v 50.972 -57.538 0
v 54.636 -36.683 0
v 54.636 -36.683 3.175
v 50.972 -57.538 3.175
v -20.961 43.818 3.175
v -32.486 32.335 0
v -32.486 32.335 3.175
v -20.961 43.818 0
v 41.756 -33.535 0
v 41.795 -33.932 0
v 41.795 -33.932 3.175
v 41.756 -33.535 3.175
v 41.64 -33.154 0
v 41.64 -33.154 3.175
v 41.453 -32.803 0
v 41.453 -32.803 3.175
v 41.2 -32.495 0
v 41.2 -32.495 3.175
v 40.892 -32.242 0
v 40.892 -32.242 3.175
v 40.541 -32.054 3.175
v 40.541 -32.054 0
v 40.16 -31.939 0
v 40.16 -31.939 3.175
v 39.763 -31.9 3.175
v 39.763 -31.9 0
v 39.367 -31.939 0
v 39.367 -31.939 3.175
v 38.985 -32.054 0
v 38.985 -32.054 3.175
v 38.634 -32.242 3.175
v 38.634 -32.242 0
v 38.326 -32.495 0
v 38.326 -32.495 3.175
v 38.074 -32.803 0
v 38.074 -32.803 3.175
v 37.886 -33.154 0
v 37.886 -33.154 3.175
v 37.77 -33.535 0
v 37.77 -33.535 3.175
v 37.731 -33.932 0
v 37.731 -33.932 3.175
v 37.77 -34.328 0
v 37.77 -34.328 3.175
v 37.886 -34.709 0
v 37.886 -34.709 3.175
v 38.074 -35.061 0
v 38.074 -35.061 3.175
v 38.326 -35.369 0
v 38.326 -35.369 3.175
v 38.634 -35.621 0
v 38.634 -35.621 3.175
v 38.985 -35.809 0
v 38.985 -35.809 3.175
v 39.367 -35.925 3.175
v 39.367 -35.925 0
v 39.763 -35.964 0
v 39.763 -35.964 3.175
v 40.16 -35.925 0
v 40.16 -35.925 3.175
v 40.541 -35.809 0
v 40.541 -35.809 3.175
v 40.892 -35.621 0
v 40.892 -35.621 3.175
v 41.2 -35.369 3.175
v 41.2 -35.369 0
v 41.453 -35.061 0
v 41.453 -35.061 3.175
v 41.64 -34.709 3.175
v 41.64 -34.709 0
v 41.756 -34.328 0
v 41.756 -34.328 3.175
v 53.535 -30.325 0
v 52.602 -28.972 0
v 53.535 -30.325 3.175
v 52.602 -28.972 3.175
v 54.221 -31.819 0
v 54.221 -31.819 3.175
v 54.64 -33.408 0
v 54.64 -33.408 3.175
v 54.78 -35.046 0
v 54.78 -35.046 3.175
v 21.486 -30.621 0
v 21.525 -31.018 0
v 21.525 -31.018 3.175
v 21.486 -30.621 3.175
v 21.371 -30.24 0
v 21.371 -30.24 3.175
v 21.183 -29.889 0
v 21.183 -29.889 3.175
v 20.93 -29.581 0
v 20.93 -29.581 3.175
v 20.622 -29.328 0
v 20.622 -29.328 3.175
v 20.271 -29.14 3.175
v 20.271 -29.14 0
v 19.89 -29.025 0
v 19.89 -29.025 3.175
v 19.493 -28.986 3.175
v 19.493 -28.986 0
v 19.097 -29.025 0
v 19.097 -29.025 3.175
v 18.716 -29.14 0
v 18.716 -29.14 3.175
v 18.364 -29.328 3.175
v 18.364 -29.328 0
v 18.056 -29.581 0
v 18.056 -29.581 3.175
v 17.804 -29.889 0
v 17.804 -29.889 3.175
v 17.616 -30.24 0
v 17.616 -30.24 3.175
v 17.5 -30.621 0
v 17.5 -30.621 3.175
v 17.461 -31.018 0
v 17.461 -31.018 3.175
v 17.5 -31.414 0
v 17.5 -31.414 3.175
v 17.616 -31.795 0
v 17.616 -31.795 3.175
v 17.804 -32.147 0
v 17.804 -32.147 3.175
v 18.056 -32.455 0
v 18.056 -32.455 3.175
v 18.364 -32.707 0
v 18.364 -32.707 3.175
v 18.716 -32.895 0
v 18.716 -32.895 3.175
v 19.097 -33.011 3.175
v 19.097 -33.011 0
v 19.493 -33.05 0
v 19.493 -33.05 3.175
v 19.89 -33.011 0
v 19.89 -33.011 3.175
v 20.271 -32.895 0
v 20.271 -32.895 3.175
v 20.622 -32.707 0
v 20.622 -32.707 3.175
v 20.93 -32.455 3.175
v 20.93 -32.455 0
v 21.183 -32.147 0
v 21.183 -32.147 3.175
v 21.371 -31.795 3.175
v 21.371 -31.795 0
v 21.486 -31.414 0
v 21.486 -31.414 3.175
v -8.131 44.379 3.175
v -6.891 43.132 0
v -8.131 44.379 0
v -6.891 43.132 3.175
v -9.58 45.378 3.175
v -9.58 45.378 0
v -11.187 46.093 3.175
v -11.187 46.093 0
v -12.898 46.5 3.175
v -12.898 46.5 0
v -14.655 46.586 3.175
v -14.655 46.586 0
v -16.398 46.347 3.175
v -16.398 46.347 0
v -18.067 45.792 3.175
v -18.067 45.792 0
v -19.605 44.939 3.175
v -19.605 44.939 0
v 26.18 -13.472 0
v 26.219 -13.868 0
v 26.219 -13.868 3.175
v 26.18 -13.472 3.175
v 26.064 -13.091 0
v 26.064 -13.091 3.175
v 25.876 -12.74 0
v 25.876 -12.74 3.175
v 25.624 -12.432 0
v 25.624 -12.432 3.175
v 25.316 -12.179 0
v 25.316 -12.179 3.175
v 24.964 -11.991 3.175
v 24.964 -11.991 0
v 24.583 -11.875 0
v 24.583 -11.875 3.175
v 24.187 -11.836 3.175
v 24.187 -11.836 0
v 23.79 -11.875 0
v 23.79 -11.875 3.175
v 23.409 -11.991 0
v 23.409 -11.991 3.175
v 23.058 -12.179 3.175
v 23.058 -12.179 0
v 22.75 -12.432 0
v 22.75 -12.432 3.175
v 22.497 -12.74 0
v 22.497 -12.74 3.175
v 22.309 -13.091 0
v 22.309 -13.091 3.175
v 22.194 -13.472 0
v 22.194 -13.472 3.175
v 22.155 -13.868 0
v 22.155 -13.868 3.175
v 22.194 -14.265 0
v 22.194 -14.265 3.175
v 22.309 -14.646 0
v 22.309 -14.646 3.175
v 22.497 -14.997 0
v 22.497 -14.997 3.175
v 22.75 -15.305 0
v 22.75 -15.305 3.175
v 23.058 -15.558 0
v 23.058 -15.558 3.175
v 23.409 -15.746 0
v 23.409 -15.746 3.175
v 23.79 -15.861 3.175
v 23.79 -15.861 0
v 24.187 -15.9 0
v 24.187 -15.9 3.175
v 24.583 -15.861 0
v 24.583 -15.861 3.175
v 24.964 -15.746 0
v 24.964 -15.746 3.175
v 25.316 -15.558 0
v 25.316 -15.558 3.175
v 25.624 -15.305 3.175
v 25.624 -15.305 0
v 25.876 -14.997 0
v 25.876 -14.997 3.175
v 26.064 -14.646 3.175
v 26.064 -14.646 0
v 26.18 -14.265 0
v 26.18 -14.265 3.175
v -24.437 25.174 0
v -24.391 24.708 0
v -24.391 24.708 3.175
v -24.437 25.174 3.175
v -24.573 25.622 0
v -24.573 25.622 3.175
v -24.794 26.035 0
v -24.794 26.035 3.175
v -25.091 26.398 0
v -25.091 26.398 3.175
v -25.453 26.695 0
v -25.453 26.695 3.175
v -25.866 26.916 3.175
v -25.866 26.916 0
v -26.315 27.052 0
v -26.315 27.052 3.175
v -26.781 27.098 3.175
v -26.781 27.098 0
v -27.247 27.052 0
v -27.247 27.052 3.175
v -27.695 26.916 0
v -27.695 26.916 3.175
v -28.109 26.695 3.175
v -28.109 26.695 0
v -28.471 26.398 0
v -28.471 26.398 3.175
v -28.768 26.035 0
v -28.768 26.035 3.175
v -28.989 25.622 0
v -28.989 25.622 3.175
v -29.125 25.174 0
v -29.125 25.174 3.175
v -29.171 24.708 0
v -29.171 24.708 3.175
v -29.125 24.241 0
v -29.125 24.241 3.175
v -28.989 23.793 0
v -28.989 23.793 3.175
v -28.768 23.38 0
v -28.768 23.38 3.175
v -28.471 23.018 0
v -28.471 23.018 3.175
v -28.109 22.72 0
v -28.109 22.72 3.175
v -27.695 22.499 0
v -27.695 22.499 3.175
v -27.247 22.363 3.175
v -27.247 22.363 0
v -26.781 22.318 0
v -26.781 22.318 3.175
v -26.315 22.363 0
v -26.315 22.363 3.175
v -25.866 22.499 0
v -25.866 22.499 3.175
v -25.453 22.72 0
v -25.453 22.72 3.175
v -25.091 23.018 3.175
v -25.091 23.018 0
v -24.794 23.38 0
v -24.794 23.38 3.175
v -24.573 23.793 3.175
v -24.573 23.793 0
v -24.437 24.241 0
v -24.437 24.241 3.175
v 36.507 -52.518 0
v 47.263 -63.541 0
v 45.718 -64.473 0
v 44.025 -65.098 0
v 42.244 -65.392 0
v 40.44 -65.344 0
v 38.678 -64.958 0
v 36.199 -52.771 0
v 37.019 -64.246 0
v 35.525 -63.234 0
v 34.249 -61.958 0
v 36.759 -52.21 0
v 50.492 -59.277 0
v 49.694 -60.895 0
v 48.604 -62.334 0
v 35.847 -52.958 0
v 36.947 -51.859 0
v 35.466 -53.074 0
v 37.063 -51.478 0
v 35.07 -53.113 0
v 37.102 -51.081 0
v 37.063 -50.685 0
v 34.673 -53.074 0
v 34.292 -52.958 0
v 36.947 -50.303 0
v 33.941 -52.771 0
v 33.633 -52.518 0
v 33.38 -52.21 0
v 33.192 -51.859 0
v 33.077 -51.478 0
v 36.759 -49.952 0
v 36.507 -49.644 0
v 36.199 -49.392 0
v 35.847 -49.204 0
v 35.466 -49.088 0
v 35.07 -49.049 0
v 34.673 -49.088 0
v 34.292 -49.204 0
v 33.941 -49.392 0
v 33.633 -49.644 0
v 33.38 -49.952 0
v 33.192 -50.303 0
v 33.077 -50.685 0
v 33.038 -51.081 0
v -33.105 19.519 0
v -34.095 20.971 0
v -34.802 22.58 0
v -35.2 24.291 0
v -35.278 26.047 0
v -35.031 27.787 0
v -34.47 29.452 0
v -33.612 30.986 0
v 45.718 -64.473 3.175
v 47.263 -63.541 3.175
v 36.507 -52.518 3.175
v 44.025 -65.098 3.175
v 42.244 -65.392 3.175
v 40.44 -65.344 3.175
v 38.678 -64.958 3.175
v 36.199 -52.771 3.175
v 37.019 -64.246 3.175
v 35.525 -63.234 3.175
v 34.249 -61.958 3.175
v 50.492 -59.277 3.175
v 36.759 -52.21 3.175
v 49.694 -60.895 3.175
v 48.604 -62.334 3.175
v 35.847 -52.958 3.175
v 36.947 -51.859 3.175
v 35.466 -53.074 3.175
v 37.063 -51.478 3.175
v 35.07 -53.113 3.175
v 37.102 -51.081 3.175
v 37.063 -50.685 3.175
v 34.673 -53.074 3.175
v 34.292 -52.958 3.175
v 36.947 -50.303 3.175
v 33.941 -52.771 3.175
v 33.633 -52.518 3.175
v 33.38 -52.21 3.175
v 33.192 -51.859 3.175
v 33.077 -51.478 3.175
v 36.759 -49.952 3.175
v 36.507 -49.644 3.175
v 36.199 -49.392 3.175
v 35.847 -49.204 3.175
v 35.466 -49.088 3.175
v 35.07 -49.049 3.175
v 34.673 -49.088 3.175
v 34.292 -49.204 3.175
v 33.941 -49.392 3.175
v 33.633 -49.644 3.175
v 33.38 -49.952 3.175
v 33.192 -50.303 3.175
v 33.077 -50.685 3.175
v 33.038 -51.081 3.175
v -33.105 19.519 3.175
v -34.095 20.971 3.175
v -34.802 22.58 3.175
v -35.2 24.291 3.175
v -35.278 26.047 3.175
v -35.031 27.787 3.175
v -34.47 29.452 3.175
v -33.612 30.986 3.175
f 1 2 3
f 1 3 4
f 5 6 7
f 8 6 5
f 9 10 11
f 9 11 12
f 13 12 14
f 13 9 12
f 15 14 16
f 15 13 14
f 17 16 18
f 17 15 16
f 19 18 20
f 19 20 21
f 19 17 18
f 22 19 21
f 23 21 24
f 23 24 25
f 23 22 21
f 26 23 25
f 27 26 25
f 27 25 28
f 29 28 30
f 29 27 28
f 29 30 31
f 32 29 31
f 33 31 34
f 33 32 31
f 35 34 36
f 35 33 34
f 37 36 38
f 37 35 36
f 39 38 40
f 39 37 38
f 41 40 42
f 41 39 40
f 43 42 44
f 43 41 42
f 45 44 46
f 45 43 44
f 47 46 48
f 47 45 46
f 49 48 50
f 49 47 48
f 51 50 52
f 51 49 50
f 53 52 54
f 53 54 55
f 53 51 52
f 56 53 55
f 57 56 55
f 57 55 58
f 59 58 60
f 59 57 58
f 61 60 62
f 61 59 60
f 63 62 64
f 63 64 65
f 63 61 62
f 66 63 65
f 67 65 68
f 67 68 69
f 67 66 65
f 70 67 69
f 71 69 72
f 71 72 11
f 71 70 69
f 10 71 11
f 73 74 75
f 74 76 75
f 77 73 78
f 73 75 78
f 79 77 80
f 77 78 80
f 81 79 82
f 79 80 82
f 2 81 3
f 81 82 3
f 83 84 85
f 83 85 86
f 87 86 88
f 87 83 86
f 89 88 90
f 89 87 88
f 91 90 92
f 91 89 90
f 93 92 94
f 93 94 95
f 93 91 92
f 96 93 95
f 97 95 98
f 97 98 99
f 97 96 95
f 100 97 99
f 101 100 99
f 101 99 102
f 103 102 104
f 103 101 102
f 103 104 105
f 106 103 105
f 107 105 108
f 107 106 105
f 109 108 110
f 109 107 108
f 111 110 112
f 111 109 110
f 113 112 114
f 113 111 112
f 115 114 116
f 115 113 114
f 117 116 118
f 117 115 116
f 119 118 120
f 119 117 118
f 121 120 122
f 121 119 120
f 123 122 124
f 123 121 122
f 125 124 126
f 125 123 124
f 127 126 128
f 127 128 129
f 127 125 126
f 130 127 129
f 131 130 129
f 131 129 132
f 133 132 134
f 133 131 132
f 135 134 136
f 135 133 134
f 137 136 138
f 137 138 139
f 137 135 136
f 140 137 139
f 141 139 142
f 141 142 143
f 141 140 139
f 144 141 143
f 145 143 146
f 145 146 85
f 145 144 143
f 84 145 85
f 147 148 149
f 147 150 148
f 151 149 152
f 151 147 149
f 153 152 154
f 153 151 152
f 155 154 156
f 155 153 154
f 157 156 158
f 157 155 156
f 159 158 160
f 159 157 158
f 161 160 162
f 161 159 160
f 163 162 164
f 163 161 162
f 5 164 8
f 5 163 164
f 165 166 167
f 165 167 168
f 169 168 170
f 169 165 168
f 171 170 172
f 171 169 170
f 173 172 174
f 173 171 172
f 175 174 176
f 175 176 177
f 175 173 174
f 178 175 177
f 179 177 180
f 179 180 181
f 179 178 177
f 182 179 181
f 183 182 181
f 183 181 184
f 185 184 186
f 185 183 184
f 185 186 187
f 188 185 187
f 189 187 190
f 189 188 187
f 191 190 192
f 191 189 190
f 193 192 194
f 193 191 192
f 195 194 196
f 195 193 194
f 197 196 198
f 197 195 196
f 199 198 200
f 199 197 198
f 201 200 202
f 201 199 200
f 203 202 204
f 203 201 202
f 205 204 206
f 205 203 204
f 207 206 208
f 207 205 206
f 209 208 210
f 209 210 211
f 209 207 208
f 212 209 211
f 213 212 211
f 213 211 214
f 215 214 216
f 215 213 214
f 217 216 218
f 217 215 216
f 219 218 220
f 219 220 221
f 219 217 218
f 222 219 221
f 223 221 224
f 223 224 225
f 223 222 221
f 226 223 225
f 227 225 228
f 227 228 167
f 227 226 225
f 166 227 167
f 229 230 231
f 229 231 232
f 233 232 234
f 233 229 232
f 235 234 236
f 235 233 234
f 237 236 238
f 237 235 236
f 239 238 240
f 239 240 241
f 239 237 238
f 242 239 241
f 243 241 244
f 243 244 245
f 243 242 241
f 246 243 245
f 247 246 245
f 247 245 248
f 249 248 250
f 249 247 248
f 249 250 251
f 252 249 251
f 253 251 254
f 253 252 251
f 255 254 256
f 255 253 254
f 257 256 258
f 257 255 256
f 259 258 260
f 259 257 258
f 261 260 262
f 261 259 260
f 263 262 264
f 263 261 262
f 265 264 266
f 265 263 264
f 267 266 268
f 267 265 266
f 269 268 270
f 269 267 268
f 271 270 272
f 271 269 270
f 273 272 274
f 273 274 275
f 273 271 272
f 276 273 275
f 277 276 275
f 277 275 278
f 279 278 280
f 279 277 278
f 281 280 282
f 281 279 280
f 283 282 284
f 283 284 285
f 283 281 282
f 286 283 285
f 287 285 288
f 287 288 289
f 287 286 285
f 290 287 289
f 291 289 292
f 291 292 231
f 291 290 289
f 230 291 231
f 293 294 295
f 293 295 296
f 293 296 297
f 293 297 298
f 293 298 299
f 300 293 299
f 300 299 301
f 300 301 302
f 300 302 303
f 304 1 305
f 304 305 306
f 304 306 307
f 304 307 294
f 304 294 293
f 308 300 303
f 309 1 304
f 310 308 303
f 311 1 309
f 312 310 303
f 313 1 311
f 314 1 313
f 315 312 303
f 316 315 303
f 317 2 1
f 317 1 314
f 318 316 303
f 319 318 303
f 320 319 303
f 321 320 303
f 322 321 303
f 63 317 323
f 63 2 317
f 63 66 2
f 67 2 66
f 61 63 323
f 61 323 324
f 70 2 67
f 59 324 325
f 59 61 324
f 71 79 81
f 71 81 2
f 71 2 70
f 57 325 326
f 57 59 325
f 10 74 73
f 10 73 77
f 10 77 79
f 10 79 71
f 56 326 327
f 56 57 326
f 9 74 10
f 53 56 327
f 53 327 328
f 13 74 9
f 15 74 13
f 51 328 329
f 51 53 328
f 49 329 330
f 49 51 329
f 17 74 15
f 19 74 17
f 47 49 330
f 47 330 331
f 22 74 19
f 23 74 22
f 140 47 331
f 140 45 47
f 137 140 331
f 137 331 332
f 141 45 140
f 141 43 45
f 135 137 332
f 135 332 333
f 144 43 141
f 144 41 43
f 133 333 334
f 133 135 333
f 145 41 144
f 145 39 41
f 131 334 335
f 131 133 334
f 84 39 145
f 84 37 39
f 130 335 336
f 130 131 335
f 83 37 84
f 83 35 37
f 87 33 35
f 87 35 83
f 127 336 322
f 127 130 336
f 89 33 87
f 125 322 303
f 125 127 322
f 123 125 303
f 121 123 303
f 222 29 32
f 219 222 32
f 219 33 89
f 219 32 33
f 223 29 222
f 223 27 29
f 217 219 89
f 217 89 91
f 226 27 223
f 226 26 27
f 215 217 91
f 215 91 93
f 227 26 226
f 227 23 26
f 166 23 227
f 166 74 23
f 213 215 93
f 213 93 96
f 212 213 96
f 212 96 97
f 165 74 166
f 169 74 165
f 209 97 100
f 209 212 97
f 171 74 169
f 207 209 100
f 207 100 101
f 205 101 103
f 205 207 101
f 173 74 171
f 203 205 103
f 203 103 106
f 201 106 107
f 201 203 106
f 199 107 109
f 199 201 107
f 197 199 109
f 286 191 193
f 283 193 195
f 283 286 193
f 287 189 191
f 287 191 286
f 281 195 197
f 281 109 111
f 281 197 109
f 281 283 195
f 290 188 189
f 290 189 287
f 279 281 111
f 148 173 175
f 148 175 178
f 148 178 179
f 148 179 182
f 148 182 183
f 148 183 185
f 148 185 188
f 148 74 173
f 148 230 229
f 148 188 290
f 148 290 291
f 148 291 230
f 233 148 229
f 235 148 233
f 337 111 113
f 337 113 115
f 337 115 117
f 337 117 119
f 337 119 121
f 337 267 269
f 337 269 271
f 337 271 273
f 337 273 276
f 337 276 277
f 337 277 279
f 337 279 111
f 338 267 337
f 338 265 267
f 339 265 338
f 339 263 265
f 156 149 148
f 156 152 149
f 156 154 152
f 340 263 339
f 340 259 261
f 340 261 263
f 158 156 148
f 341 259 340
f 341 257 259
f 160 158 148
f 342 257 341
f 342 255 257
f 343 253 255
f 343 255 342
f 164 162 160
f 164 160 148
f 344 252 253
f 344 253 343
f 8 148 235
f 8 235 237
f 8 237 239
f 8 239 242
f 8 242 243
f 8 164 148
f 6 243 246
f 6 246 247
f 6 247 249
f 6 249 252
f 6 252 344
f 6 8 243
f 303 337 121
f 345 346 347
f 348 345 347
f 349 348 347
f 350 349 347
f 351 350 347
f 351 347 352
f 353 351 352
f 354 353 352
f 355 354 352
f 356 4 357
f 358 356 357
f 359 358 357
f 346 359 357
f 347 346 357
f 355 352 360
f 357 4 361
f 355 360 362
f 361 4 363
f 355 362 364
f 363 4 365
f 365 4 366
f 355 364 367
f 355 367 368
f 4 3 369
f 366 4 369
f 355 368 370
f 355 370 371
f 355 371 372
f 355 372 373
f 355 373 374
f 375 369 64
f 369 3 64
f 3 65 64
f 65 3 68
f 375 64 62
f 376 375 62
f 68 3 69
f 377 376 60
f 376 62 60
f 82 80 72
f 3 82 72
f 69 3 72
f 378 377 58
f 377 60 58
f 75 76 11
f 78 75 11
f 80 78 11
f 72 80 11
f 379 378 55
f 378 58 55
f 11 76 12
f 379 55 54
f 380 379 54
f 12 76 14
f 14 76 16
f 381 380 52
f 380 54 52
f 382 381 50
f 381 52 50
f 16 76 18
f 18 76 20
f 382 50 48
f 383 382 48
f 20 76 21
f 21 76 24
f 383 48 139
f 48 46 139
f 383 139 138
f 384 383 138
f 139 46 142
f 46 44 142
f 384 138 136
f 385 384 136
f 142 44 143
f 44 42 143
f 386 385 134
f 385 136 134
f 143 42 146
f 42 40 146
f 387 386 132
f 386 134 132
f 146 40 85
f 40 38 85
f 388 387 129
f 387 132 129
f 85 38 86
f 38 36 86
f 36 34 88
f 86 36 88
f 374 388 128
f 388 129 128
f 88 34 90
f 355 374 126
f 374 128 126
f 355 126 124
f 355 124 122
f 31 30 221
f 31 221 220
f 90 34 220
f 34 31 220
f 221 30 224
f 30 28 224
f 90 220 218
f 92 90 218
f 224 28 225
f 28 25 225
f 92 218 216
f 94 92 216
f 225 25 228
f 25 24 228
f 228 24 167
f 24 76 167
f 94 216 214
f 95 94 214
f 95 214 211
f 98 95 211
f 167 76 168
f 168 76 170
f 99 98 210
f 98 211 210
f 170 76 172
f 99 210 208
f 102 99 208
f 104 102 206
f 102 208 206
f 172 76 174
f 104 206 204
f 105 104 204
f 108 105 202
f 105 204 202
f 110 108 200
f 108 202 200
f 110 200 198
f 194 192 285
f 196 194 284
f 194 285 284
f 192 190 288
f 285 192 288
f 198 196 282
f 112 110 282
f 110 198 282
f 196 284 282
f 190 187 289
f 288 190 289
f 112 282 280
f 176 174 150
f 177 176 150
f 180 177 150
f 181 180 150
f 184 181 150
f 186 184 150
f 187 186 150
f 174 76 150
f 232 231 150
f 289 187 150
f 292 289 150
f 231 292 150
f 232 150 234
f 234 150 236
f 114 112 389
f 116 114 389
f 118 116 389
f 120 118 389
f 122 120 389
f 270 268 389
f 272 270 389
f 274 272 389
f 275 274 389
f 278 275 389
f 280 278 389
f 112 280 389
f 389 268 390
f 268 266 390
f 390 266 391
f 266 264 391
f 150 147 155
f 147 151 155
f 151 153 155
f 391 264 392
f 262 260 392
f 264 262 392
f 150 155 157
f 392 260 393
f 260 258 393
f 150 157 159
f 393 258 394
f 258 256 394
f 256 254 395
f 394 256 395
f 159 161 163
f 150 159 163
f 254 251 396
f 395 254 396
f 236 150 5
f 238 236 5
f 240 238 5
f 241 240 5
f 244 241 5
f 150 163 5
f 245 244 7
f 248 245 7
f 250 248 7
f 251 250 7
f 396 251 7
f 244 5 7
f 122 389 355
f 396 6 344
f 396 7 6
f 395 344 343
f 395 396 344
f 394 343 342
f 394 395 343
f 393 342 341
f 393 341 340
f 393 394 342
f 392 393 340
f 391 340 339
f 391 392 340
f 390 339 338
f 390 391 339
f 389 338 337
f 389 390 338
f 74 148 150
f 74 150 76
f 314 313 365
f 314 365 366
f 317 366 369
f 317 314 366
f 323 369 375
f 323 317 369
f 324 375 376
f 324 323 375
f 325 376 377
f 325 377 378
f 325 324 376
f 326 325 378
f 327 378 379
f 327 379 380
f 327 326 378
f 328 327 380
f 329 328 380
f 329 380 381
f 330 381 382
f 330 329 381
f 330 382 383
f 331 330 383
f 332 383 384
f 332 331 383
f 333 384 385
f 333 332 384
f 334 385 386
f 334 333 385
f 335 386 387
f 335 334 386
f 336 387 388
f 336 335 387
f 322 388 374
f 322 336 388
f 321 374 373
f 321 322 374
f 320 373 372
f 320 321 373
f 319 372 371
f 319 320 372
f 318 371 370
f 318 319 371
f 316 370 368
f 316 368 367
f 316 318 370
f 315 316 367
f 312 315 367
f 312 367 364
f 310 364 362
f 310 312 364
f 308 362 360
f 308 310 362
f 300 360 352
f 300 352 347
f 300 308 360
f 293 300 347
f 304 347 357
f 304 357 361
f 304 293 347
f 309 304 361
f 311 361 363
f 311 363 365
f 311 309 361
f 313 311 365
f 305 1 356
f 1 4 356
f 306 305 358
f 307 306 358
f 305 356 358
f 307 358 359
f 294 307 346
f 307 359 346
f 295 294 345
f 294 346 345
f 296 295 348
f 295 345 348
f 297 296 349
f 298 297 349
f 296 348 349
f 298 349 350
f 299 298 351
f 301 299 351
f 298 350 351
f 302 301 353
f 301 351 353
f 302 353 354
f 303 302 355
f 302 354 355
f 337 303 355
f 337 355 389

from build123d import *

# Parameters (mm, degrees)
SKETCH1_R           = 2.39
SKETCH1_R_2         = 2.032
BOSS_EXTRUDE1_DEPTH = 3.175
FILLET1_R           = 9.525


with BuildPart() as part:
    # Sketch1 → Boss-Extrude1 (new body)
    with BuildSketch(Plane.XY):
        Polygon((-13.549562782, 51.201238591), (55.395997605, -32.358681046), (47.399630983, -77.865858829), (-38.635835903, 26.208991527), align=None)
        with Locations((-26.780789006, 24.707545021)):
            Circle(SKETCH1_R, mode=Mode.SUBTRACT)
        with Locations((24.186660888, -13.868436177)):
            Circle(SKETCH1_R_2, mode=Mode.SUBTRACT)
        with Locations((19.493324021, -31.017809025)):
            Circle(SKETCH1_R_2, mode=Mode.SUBTRACT)
        with Locations((39.76308397, -33.93171218)):
            Circle(SKETCH1_R_2, mode=Mode.SUBTRACT)
        with Locations((35.069747103, -51.081085027)):
            Circle(SKETCH1_R_2, mode=Mode.SUBTRACT)
    extrude(amount=BOSS_EXTRUDE1_DEPTH)

    # Fillet1
    fillet1_edges = [part.edges().sort_by_distance(p)[0] for p in [
        (-13.549562782, 51.201238591, 1.5875),
        (55.395997605, -32.358681046, 1.5875),
        (47.399630983, -77.865858829, 1.5875),
        (-38.635835903, 26.208991527, 1.5875),
    ]]
    fillet(fillet1_edges, radius=FILLET1_R)


solid = part.part
